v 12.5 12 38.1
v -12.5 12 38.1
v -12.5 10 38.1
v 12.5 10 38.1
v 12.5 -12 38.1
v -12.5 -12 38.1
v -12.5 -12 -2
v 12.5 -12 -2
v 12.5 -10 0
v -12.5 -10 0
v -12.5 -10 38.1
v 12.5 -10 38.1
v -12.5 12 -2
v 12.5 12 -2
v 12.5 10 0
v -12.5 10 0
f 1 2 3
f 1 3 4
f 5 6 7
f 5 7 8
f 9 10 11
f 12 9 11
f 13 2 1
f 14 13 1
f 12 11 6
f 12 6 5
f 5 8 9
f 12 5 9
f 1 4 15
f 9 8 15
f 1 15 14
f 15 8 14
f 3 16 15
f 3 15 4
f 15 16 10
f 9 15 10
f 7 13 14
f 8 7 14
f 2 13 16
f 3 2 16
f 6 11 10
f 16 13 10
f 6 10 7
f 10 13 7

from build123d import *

# Parameters (mm, degrees)
F0_W     = 29
F0_H     = 24
F0_W_2   = 25
F0_H_2   = 20
F1_DEPTH = 38.1
F2_DEPTH = 2
F3_W     = 20
F3_H     = 38.1
F4_DEPTH = 29.001
F6_DEPTH = 40.101


with BuildPart() as f1:
    # F0 (on Top) → F1 (new body)
    with BuildSketch(Plane.XY):
        Rectangle(F0_W, F0_H)
        Rectangle(F0_W_2, F0_H_2, mode=Mode.SUBTRACT)
    extrude(amount=F1_DEPTH)

    # F0 (on Top) → F2 (join)
    with BuildSketch(Plane.XY):
        Rectangle(F0_W, F0_H)
        Rectangle(F0_W_2, F0_H_2, mode=Mode.SUBTRACT)
        Rectangle(F0_W_2, F0_H_2)
    extrude(amount=-F2_DEPTH)

    # F3 (on face) → F4 (cut, through all)
    with BuildSketch(Plane(origin=(-14.5, 0, 0), x_dir=(0, -1, 0), z_dir=(-1, 0, 0))):
        with Locations((0, 19.05)):
            Rectangle(F3_W, F3_H)
    extrude(amount=-F4_DEPTH, mode=Mode.SUBTRACT)

    # F5 (on face) → F6 (cut, through all)
    with BuildSketch(Plane(origin=(0, 0, -2), x_dir=(1, 0, 0), z_dir=(0, 0, -1))):
        Polygon((-12.5, 10), (-12.5, 12), (-14.5, 12), (-14.5, -12), (-12.5, -12), (-12.5, -10), align=None)
        Polygon((14.5, -12), (14.5, 12), (12.5, 12), (12.5, 10), (12.5, -10), (12.5, -12), align=None)
    extrude(amount=-F6_DEPTH, mode=Mode.SUBTRACT)


solid = f1.part
